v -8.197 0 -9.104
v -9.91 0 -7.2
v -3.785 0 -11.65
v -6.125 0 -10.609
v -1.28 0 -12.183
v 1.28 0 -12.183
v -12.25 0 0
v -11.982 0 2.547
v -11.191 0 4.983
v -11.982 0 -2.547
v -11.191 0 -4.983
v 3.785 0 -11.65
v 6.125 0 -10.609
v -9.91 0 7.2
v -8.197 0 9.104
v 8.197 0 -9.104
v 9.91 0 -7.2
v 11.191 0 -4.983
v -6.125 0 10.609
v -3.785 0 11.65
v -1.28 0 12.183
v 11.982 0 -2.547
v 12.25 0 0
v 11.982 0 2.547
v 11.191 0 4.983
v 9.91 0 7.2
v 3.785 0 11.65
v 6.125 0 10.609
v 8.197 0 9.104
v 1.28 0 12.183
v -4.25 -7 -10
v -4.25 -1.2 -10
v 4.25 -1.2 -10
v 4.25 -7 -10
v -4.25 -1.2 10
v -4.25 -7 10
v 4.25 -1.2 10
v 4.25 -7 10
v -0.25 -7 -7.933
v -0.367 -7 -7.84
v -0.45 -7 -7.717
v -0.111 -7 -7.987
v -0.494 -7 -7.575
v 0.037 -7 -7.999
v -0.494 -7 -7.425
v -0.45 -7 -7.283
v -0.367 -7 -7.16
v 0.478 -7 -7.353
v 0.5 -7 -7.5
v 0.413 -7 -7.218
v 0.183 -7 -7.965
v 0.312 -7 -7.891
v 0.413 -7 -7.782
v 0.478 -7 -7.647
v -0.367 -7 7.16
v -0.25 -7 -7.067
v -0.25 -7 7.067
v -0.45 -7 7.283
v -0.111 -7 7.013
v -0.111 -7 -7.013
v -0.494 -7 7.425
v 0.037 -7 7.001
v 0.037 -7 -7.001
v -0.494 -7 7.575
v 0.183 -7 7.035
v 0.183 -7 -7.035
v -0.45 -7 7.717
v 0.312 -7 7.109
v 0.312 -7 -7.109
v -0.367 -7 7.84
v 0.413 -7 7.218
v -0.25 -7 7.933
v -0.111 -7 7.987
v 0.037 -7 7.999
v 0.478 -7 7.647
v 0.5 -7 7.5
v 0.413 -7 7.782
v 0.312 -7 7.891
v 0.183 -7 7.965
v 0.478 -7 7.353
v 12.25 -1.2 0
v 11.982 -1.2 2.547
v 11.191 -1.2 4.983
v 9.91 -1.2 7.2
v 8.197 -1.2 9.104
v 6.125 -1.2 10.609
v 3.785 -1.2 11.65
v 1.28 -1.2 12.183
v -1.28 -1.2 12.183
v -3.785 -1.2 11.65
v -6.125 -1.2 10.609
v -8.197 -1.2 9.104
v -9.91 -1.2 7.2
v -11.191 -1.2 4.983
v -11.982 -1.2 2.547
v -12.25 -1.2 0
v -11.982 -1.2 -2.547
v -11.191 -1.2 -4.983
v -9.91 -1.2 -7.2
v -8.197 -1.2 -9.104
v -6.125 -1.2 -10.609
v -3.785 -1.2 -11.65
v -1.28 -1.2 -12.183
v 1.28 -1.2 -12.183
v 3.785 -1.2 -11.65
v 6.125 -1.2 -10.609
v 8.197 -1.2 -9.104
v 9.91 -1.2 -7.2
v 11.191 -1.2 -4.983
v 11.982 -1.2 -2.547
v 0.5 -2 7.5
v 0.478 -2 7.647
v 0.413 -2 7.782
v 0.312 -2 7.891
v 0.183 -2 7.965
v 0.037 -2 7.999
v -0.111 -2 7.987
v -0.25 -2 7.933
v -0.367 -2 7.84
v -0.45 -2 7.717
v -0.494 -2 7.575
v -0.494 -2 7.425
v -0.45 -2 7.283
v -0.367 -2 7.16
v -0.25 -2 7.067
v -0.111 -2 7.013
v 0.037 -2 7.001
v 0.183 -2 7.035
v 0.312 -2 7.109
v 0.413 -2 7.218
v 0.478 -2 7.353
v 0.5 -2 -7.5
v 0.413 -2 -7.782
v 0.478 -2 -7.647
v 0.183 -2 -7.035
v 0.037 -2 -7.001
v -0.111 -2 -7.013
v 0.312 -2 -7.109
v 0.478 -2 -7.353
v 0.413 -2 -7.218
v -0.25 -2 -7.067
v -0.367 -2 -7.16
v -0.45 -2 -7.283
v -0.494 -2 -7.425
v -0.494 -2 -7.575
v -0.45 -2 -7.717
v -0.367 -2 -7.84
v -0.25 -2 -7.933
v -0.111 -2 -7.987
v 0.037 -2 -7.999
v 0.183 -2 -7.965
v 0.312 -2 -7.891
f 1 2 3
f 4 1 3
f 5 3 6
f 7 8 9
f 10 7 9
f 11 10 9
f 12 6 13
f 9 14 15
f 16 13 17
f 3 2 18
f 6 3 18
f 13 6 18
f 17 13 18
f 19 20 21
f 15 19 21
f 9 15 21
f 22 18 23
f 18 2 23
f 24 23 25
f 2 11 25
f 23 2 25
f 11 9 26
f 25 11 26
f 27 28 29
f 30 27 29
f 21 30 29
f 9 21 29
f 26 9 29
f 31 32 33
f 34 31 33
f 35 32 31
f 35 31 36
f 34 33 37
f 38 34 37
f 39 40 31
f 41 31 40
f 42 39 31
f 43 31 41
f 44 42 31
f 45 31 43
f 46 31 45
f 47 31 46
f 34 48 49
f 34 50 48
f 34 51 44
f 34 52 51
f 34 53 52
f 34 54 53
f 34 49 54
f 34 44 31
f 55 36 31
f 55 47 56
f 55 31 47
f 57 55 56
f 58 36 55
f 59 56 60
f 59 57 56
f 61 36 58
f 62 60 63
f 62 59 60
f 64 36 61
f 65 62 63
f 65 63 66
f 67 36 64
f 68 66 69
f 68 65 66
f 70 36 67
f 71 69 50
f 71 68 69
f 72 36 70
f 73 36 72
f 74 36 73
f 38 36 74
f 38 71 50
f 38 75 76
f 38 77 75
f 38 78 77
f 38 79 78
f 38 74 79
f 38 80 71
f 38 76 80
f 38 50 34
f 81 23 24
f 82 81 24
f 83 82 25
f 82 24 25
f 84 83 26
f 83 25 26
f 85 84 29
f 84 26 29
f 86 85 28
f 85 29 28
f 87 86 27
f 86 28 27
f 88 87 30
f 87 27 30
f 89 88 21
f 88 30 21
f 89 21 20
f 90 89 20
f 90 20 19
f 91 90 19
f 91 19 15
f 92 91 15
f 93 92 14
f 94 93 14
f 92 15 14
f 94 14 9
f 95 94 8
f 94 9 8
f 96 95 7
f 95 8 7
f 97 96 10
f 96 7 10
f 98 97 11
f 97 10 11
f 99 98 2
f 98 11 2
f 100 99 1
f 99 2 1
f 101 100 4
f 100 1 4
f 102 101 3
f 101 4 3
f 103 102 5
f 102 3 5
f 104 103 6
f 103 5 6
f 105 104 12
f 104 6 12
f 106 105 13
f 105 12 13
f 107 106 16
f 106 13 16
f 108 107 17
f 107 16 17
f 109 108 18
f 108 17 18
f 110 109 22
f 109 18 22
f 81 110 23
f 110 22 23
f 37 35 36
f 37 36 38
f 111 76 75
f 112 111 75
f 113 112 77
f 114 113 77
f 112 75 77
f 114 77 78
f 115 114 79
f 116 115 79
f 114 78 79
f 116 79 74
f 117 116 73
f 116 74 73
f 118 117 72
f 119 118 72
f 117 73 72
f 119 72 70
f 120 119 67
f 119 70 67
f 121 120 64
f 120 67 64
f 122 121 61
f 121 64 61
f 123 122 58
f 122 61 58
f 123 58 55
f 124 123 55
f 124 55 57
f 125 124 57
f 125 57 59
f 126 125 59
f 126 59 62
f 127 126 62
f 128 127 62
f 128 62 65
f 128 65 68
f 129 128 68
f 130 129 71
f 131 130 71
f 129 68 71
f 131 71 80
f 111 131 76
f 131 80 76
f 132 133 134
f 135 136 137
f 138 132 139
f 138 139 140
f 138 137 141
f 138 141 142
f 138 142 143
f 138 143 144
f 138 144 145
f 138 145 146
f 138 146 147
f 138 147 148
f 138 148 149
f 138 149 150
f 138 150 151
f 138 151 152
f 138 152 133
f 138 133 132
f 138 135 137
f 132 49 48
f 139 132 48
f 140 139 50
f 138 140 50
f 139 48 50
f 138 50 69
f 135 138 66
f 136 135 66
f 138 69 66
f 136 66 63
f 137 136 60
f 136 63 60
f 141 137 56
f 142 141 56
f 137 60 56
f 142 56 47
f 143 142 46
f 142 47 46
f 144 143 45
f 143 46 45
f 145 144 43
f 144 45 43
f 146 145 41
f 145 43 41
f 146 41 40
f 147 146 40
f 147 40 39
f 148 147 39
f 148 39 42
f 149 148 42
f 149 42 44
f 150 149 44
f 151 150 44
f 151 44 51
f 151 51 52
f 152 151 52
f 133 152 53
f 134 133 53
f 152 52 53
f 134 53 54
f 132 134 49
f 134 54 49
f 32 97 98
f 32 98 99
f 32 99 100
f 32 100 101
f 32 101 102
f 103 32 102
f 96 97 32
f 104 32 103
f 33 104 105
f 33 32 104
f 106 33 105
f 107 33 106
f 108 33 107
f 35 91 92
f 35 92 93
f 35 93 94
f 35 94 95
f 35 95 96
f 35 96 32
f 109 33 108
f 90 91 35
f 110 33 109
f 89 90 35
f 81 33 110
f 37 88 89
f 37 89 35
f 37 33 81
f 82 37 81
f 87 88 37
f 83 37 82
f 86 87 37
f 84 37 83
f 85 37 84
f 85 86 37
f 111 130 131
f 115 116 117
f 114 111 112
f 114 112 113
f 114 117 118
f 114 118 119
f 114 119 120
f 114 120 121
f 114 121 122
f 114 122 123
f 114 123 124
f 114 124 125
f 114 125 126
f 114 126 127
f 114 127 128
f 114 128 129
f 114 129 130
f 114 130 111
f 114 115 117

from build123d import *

# Parameters (mm, degrees)
F0_R     = 12.25
F0_W     = 8.5
F0_H     = 20
F1_DEPTH = 1.2
F2_DEPTH = 7
F3_R     = 0.5
F4_DEPTH = 5


with BuildPart() as f1:
    # F0 (on Front) → F1 (new body)
    with BuildSketch(Plane.XZ):
        Circle(F0_R)
        Rectangle(F0_W, F0_H, mode=Mode.SUBTRACT)
    extrude(amount=F1_DEPTH)

    # F0 (on Front) → F2 (join)
    with BuildSketch(Plane.XZ):
        Rectangle(F0_W, F0_H)
    extrude(amount=F2_DEPTH)

    # F3 (on face) → F4 (cut)
    with BuildSketch(Plane.XZ.offset(7)):
        with Locations((0, -7.5)):
            Circle(F3_R)
        with Locations((0, 7.5)):
            Circle(F3_R)
    extrude(amount=-F4_DEPTH, mode=Mode.SUBTRACT)


solid = f1.part
